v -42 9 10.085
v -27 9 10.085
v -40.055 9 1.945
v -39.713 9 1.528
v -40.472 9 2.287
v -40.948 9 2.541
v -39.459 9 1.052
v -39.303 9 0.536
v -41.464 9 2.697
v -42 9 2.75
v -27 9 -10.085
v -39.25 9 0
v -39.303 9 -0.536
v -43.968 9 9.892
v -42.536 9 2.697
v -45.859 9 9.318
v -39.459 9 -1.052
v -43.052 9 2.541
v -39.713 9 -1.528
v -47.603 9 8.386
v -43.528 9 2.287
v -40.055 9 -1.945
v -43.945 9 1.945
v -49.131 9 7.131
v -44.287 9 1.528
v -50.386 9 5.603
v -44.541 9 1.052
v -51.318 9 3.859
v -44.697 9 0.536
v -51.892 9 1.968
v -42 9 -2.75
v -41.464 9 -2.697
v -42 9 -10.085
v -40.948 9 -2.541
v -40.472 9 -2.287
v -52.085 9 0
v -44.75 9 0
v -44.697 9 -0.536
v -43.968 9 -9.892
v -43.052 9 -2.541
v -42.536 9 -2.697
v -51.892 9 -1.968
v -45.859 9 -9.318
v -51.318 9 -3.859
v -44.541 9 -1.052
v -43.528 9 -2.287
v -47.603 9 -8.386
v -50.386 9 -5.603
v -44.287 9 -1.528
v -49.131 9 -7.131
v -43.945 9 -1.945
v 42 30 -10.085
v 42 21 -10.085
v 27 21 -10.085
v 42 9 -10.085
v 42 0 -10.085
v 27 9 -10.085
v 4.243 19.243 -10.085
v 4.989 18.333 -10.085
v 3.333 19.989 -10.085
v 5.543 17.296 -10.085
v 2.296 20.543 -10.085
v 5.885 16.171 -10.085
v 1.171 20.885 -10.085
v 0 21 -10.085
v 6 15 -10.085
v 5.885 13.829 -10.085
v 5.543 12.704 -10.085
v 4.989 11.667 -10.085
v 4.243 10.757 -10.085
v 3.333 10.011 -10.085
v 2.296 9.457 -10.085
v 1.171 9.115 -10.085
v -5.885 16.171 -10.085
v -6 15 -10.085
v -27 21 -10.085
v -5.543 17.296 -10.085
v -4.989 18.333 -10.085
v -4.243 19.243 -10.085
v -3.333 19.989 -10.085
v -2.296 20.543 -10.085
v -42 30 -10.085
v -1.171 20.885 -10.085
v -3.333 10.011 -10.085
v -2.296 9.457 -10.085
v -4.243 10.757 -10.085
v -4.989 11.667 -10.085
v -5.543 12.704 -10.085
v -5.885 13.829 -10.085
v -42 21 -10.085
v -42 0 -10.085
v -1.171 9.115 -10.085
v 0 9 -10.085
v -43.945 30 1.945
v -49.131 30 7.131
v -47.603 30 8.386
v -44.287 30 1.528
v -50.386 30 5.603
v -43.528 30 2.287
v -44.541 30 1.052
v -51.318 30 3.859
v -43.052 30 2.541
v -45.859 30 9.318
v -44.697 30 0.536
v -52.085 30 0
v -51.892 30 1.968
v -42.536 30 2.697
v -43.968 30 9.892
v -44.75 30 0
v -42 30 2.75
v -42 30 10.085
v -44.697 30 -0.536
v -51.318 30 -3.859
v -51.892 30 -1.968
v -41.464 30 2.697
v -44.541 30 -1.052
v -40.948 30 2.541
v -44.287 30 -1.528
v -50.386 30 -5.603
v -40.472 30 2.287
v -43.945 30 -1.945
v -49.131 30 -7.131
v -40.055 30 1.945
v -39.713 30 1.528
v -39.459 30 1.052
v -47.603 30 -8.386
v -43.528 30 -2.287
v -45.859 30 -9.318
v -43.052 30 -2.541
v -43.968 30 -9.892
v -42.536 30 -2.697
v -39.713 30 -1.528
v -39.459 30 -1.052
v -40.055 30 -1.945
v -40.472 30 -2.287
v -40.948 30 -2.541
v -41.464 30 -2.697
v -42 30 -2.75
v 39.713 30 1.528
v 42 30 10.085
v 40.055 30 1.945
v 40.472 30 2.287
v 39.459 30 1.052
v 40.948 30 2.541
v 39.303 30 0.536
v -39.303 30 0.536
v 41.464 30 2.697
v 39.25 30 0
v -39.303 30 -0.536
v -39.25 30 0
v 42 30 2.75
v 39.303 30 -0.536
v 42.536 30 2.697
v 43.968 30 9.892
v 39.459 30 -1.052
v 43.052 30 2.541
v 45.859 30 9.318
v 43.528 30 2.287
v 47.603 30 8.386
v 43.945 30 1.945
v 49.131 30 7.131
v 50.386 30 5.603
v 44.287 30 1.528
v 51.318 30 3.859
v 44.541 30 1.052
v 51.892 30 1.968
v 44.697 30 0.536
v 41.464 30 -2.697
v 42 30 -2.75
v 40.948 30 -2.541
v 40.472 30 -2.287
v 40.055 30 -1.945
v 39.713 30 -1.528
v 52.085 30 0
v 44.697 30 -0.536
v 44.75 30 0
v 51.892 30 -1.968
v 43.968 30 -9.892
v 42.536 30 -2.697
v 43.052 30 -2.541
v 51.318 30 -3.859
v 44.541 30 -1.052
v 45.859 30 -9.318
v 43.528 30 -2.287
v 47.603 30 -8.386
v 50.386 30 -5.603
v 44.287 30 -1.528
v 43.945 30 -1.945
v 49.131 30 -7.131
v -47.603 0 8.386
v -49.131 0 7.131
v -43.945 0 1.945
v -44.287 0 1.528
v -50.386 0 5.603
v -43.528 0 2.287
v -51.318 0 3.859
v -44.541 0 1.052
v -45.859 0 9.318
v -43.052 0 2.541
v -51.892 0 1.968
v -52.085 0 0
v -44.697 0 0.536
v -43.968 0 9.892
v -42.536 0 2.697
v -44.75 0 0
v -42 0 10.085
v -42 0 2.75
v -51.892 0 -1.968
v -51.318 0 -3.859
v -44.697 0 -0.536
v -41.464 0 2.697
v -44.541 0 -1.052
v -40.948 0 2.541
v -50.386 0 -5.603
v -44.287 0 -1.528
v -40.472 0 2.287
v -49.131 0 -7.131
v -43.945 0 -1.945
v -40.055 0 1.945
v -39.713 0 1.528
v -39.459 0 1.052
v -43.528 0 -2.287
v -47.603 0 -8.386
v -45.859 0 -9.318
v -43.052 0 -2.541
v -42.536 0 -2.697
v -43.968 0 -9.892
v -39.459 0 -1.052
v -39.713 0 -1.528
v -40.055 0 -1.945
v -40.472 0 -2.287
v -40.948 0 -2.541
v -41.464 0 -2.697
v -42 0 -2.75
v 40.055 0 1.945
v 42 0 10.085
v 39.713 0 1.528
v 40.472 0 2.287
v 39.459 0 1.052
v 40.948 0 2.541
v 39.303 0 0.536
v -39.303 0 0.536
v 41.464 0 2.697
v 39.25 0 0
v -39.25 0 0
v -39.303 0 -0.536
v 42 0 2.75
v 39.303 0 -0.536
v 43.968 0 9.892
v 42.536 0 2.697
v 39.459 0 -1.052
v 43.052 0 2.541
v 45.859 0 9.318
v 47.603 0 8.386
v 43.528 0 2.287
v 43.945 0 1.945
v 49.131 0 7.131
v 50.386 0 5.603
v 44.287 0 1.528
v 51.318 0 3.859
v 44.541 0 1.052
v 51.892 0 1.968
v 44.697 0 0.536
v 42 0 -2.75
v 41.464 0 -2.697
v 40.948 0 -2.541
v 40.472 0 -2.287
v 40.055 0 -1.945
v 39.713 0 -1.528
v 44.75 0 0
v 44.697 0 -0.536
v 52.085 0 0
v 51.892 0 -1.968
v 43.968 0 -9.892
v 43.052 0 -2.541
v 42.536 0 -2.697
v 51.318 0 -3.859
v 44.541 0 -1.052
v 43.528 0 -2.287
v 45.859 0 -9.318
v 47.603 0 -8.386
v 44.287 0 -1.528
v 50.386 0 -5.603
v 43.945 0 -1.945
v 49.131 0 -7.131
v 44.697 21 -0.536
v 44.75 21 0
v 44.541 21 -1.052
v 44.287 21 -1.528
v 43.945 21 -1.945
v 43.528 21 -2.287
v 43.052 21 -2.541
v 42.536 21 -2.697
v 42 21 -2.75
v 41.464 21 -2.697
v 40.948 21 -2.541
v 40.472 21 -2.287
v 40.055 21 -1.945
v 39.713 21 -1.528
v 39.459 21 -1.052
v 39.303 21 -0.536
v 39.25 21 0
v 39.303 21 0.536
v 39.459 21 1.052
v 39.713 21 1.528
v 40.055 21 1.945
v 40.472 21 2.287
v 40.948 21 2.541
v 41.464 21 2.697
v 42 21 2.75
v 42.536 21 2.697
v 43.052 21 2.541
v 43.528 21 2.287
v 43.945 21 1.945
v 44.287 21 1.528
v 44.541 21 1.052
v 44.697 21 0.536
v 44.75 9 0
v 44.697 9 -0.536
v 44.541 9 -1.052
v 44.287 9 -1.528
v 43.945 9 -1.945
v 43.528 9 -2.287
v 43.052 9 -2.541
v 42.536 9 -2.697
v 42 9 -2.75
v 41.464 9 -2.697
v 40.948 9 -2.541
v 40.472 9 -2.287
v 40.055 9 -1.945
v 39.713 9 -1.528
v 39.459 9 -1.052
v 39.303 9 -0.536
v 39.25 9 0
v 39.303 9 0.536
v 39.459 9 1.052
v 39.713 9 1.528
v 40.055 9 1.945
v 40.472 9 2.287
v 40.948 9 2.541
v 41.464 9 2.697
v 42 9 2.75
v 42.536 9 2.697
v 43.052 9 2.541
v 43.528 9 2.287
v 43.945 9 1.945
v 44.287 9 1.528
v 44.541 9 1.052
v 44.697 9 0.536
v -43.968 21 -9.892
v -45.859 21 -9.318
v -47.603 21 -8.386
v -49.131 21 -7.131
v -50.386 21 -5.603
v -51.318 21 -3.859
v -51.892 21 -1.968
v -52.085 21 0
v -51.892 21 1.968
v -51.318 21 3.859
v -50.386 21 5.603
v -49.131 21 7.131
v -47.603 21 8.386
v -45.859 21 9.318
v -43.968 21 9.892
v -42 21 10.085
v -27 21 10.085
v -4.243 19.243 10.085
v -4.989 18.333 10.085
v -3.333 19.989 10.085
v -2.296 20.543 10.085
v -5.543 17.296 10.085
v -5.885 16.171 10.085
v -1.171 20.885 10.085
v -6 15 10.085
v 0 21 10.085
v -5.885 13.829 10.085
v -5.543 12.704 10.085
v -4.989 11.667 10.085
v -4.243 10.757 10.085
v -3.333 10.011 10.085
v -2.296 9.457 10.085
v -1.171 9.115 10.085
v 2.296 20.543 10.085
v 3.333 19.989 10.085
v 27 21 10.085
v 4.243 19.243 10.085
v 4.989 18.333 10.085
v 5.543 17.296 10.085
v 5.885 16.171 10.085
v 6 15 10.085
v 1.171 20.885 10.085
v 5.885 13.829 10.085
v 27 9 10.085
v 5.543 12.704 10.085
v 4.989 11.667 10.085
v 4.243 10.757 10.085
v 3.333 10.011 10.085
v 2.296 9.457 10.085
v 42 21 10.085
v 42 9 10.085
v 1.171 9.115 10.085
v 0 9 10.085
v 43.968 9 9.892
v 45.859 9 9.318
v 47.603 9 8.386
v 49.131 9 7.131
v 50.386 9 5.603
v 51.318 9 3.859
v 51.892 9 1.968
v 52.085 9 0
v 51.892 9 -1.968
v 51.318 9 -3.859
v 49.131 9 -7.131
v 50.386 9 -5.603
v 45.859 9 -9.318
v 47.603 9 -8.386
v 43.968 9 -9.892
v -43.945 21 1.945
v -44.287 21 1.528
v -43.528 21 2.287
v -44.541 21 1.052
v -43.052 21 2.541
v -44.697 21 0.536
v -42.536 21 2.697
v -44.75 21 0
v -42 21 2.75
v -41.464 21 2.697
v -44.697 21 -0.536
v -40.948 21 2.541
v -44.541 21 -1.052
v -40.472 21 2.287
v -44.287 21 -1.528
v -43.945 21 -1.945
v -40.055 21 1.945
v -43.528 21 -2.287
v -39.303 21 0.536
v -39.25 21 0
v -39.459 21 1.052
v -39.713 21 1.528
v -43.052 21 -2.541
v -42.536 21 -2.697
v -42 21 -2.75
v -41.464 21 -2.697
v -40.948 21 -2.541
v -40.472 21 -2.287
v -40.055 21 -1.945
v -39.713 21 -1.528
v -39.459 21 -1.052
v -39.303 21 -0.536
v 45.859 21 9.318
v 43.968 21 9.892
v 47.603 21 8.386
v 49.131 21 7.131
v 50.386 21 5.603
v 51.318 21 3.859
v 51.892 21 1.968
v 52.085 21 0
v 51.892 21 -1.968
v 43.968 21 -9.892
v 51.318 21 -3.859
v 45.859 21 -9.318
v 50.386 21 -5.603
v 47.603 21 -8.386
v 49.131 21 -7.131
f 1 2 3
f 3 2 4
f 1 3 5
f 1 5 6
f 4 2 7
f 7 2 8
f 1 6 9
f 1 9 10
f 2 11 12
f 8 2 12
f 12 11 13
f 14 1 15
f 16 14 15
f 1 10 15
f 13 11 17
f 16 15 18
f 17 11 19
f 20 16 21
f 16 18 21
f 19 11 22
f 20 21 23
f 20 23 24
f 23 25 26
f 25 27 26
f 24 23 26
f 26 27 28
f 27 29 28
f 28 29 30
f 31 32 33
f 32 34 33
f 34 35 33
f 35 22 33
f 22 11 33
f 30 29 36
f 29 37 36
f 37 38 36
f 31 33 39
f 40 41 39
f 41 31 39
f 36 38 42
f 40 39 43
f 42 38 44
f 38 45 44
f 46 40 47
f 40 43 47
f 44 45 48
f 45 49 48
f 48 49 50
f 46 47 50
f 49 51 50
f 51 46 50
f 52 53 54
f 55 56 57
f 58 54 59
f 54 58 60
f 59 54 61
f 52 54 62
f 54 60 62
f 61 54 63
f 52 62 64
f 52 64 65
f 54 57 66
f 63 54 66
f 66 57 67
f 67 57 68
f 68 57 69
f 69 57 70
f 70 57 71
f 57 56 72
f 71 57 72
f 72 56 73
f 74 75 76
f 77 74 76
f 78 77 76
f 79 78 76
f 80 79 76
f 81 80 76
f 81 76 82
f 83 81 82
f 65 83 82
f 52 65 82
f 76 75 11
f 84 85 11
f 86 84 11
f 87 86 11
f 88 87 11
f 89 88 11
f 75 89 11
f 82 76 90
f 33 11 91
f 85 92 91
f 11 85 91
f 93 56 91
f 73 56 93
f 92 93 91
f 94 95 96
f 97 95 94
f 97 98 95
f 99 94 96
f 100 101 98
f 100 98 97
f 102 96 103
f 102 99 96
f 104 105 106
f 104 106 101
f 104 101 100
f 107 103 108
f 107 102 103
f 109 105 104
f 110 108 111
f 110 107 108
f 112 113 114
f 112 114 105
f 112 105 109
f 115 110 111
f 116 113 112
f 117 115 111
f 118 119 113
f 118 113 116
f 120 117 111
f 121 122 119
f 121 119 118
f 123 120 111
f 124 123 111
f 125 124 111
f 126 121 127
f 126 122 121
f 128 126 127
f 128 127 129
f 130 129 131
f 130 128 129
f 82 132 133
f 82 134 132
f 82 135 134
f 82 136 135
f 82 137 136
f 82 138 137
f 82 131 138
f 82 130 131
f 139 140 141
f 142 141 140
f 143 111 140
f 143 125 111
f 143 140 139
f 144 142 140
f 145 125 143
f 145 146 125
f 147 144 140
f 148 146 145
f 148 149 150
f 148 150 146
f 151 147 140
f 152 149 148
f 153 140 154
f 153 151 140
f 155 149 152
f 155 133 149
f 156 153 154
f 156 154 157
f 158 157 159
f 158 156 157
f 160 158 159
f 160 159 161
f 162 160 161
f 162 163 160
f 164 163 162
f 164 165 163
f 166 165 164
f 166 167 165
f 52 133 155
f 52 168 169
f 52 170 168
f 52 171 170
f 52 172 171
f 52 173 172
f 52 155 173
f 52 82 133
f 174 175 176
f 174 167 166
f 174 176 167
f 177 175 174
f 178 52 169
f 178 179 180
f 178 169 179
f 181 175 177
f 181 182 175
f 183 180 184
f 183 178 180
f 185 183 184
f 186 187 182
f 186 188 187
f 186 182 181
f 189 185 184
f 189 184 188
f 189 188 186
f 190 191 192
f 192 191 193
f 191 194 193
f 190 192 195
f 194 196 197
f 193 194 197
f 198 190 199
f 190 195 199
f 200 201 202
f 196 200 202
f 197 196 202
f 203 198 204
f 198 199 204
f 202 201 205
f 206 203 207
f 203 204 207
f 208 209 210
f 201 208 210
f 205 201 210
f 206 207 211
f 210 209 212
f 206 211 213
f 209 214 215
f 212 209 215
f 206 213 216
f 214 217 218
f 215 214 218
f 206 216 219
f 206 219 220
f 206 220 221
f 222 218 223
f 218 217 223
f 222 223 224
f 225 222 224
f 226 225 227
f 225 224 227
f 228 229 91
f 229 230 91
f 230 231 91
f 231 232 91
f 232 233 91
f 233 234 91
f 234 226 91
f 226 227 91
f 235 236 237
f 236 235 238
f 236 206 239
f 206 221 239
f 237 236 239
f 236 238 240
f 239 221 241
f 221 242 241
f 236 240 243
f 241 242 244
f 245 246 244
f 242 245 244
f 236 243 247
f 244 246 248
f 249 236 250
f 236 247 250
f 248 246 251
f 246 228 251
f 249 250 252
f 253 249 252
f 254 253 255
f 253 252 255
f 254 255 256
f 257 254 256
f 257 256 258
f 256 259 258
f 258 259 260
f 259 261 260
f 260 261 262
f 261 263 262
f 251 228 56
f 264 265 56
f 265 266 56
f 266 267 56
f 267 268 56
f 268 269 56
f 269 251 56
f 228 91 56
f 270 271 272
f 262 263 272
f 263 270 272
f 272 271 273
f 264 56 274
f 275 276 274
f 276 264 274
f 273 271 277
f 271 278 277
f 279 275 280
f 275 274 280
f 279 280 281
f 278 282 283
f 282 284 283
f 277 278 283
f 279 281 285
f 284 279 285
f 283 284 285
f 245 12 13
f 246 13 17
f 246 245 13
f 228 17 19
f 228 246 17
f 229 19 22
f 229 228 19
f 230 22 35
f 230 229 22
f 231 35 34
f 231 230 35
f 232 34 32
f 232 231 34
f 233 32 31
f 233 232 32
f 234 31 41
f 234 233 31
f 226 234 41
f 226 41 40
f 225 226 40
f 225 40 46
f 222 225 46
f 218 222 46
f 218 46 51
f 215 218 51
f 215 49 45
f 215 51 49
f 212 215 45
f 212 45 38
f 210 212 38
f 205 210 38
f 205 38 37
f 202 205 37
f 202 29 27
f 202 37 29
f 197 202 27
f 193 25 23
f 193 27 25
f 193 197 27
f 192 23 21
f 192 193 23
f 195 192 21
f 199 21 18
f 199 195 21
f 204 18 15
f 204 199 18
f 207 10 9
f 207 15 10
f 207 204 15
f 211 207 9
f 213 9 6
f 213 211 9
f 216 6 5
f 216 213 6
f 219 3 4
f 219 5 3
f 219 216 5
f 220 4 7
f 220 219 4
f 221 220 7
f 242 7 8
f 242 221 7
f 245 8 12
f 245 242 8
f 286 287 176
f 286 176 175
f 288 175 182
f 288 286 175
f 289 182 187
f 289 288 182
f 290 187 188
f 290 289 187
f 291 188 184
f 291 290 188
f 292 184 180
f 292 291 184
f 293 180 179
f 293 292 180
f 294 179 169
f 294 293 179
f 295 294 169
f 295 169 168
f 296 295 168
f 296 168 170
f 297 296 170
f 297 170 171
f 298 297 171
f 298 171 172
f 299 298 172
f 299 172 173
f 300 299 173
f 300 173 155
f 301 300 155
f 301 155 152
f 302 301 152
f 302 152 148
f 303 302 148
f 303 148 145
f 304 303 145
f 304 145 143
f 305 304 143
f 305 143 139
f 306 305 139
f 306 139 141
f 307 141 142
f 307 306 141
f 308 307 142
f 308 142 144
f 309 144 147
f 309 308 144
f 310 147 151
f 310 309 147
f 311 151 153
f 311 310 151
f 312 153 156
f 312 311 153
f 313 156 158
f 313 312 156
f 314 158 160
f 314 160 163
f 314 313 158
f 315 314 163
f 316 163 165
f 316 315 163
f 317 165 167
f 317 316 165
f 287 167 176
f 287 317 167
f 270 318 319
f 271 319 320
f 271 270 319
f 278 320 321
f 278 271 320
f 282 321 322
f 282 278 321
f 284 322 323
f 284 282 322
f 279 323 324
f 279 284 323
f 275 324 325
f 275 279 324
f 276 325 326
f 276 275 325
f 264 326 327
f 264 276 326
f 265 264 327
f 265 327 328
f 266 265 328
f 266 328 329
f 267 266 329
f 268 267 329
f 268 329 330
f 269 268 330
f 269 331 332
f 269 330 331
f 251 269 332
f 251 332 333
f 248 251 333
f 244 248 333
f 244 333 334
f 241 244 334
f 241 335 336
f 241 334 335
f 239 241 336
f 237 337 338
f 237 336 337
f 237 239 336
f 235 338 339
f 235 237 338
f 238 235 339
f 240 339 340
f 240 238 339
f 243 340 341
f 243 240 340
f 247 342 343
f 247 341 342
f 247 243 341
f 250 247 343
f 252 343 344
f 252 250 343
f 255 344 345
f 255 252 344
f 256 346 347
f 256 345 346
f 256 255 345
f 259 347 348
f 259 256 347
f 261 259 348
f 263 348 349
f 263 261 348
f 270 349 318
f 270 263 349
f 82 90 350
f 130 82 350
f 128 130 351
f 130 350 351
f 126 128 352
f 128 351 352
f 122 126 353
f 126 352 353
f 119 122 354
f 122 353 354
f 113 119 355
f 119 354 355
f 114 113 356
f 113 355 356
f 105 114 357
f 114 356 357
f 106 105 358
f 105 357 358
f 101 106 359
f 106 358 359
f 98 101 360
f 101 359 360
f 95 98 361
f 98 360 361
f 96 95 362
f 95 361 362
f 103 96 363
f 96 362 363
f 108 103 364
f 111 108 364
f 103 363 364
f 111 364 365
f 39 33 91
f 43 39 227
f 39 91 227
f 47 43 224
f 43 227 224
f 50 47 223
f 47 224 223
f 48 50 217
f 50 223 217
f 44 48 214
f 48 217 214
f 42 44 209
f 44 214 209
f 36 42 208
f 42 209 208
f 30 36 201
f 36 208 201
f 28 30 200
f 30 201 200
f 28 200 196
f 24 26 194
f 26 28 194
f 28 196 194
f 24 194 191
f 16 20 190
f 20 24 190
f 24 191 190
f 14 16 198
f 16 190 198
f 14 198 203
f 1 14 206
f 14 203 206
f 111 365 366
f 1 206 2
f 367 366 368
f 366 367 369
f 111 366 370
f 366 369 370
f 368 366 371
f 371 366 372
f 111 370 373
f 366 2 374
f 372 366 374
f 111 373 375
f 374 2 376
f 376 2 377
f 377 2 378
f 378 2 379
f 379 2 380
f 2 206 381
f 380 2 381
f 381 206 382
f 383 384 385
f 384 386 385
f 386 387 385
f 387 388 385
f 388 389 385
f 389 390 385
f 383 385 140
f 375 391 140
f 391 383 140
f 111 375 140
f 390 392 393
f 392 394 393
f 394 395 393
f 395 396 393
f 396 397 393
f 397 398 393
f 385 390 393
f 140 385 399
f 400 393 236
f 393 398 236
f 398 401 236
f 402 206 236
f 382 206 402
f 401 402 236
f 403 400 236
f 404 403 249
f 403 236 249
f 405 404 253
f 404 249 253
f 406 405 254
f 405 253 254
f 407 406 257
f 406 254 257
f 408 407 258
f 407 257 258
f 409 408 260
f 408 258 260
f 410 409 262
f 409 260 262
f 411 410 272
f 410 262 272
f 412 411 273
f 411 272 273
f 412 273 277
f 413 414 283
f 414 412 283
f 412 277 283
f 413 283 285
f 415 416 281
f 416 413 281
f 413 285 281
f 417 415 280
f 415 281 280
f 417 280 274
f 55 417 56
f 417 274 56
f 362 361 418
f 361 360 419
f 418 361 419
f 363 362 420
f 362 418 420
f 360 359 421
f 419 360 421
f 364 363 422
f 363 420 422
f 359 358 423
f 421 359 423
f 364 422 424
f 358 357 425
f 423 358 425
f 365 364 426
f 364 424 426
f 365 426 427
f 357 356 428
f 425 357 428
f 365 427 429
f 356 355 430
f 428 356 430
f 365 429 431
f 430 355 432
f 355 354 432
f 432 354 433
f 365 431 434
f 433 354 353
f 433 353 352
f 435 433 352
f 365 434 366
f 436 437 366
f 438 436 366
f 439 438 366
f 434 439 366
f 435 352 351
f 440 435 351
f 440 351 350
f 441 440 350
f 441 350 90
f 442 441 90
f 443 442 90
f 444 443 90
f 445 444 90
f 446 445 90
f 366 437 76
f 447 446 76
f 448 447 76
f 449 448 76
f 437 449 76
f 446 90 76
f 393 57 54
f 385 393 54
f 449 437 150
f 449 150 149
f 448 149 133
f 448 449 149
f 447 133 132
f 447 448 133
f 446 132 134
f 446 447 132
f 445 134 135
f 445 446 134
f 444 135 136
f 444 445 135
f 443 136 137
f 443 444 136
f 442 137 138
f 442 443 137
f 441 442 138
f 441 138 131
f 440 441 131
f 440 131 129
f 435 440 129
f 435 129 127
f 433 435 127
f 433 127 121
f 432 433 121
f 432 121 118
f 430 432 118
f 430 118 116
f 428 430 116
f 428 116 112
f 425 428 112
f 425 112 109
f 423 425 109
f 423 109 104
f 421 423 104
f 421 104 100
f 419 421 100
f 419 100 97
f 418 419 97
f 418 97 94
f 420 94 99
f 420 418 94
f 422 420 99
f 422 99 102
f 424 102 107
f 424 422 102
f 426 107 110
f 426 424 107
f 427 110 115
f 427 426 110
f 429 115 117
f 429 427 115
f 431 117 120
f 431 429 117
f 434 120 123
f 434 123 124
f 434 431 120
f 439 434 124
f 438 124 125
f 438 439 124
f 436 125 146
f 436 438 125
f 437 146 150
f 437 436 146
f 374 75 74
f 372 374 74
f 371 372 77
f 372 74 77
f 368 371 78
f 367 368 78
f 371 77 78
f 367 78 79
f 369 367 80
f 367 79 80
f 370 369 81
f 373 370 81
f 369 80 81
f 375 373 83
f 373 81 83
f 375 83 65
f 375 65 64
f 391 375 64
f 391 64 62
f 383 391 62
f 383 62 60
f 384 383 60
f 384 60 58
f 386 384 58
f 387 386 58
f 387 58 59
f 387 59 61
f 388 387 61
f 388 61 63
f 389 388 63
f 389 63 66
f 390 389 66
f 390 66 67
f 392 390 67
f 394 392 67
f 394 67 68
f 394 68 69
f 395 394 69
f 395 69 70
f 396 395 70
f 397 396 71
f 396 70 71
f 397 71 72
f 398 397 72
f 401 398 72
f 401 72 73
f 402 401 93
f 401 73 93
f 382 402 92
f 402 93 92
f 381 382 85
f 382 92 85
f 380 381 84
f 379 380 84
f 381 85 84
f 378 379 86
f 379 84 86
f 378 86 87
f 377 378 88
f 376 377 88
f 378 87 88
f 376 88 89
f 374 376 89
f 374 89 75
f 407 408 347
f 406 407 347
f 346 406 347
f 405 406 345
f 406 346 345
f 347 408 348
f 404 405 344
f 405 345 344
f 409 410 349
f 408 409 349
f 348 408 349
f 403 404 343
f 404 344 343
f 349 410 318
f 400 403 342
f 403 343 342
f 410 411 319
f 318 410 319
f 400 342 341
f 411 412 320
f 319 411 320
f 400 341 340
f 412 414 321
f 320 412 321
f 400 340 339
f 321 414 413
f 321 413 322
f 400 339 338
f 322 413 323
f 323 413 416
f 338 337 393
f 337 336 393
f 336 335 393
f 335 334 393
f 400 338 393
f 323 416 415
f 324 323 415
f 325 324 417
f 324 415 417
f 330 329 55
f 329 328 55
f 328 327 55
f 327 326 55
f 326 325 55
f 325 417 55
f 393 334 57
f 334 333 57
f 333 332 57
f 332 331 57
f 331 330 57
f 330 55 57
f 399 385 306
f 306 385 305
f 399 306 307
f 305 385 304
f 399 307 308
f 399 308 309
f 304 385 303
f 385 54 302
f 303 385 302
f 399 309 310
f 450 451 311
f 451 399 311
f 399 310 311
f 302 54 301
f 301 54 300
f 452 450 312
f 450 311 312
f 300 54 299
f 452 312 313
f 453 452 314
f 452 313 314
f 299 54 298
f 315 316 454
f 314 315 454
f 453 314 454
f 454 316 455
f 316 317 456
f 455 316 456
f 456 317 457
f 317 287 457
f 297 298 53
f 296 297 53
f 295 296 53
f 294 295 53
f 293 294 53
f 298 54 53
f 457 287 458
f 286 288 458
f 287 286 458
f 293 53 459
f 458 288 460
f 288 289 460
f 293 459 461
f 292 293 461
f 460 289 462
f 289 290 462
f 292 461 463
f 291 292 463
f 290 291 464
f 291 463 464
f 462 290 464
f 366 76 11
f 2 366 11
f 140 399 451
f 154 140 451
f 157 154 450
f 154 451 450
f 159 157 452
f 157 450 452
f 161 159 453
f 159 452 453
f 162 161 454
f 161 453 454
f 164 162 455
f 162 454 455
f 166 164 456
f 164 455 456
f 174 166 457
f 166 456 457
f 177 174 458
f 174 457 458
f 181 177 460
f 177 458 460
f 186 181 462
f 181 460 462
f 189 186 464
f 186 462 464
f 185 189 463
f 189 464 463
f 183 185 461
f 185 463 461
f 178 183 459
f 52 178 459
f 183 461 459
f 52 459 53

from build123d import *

# Parameters (mm, degrees)
SKETCH1_R           = 2.75
BOSS_EXTRUDE1_DEPTH = 30
SKETCH4_W           = 40.854954683
SKETCH4_H           = 12
CUT_EXTRUDE1_DEPTH  = 27
CUT_EXTRUDE2_DEPTH  = 27


with BuildPart() as part:
    # Sketch1 → Boss-Extrude1 (new body)
    with BuildSketch(Plane(origin=(0, 0, 0), x_dir=(1, 0, 0), z_dir=(0, 1, 0))):
        with BuildLine():
            Line((42, 10.085339835), (-42, 10.085339835))
            ThreePointArc((-42, 10.085339835), (-52.085339835, 0), (-42, -10.085339835))
            Line((-42, -10.085339835), (42, -10.085339835))
            ThreePointArc((42, -10.085339835), (52.085339835, 0), (42, 10.085339835))
        make_face()
        with Locations((-42, 0)):
            Circle(SKETCH1_R, mode=Mode.SUBTRACT)
        with Locations((42, 0)):
            Circle(SKETCH1_R, mode=Mode.SUBTRACT)
    extrude(amount=BOSS_EXTRUDE1_DEPTH)

    # Sketch4 → Cut-Extrude1 (cut)
    with BuildSketch(Plane(origin=(0, 0, -10.085339835), x_dir=(-1, 0, 0), z_dir=(0, 0, -1))):
        with Locations((47.427477342, 15)):
            Rectangle(SKETCH4_W, SKETCH4_H)
        with Locations((-47.427477342, 15)):
            Rectangle(SKETCH4_W, SKETCH4_H)
    extrude(amount=-CUT_EXTRUDE1_DEPTH, mode=Mode.SUBTRACT)

    # Sketch4<3> → Cut-Extrude2 (cut)
    with BuildSketch(Plane(origin=(0, 0, -10.085339835), x_dir=(-1, 0, 0), z_dir=(0, 0, -1))):
        with BuildLine():
            ThreePointArc((0, 9), (4.242640687, 10.757359313), (6, 15))
            ThreePointArc((6, 15), (-4.242640687, 19.242640687), (0, 9))
        make_face()
    extrude(amount=-CUT_EXTRUDE2_DEPTH, mode=Mode.SUBTRACT)


solid = part.part
